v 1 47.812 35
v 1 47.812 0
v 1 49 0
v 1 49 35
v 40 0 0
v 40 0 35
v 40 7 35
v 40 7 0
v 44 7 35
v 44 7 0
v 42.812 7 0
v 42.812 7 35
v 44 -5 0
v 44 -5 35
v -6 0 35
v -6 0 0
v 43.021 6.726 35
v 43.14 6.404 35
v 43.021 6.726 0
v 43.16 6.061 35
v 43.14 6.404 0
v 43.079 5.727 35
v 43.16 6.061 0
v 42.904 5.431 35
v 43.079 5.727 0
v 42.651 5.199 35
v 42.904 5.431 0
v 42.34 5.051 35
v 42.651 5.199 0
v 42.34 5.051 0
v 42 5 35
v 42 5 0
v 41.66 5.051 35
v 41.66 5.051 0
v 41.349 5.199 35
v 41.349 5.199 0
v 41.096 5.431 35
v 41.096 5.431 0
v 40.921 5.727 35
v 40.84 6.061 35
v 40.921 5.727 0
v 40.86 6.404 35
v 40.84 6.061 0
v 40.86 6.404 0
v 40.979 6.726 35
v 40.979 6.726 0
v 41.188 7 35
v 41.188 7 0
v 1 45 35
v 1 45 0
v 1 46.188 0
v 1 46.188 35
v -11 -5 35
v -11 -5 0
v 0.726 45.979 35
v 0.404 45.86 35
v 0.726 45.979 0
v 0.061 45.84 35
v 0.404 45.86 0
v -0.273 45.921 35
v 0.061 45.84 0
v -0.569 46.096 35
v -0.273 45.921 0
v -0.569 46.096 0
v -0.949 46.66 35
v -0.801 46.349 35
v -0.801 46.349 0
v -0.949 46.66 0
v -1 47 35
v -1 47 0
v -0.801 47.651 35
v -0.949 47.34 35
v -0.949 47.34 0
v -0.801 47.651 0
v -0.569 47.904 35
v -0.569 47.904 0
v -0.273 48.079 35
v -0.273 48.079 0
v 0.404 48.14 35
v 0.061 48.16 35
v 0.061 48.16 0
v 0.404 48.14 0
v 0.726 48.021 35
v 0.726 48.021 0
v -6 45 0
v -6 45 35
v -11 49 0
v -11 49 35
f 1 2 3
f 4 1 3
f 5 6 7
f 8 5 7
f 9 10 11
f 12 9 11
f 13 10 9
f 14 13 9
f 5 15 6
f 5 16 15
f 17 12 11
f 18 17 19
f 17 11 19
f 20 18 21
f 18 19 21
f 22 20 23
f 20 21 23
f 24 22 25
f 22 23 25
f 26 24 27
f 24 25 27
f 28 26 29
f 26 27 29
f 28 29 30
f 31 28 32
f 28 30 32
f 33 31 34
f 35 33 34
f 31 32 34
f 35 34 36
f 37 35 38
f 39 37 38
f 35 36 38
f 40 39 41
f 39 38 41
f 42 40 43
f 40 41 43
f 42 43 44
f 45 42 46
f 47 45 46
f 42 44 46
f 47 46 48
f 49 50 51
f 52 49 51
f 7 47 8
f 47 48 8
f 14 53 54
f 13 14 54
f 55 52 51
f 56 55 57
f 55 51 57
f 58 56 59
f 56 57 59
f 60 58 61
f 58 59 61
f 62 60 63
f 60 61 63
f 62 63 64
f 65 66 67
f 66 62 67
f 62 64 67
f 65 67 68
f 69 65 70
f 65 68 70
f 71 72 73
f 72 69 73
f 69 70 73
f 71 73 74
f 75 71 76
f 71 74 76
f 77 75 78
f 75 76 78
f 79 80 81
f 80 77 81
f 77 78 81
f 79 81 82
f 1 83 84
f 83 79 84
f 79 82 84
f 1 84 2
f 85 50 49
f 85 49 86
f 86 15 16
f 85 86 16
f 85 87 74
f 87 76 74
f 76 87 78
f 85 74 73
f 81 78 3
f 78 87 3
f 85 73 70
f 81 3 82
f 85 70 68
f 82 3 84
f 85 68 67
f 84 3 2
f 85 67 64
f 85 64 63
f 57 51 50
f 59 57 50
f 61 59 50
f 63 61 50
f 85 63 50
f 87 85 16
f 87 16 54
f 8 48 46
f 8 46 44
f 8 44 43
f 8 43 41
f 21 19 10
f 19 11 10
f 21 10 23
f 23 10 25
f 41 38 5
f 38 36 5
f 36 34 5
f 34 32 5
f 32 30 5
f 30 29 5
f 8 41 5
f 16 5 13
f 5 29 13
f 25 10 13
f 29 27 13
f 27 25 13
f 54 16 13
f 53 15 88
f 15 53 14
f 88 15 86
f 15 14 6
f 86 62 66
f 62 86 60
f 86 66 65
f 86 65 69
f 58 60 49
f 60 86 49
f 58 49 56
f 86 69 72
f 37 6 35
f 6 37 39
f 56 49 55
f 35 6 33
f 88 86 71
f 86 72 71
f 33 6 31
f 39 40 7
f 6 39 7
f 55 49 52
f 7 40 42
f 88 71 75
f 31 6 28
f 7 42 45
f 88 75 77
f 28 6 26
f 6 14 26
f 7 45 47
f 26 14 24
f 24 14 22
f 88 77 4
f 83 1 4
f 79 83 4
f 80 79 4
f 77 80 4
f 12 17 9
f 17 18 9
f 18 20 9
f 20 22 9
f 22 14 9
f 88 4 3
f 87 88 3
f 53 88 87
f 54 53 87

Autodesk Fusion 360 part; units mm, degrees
sketch "Sketch1" plane through (0, 0, 0) normal (0, 1, 0) x (1, 0, 0)
  line L0 (0, 0) -> (44, 0)
  line L1 (44, 0) -> (44, -35)
  line L2 (44, -35) -> (0, -35)
  line L3 (0, -35) -> (0, 0)
  line L4 (0, 0) -> (-5, 0)
  line L5 (0, -35) -> (-5, -35)
  line L6 (-5, -35) -> (-5, 0)
  dimension "d1" = 44
  dimension "d2" = 35
  dimension "d3" = 5
  dimension "d4" = 5
extrude "Extrude1" add sketch "Sketch1" along normal blind 49 contours L3 L4 L5 L6 makes body 1
sketch "Sketch2" plane through (0, 0, 0) normal (0, 1, 0) x (1, 0, 0)
  line L0 (0, 0) -> (44, 0)
  line L1 (44, 0) -> (44, -35)
  line L2 (44, -35) -> (0, -35)
  line L3 (0, -35) -> (0, 0)
  dimension "d7" = 44
extrude "Extrude2" add sketch "Sketch2" against normal blind 2 separate body makes body 2
extrude "Extrude3" add 1 faces at (-3.3333, 0, 11.6667) along direction (0, -1, 0) blind 2 on bodies 1 bodies 1 2
extrude "Extrude4" cut 1 faces at (-5, 15, 23.3333) along direction (1, 0, 0) blind 3 on bodies 1 bodies 1
extrude "Extrude5" add 1 faces at (14, -2, 11.6667) along direction (0, -1, 0) blind 3 on bodies 1 bodies 1
extrude "Extrude6" add 1 faces at (-2, 13, 11.6667) along direction (-1, 0, 0) blind 3 on bodies 1 bodies 1
sketch "Sketch3" plane through (0, 0, 0) normal (0, 0, 1) x (1, 0, 0)
  line L0 (40, 0) -> (44, 0)
  line L1 (0, 49) -> (7, 49)
  curve L2
  curve L3
  curve L4
  curve L5
  curve L6
  curve L7
  curve L8
  curve L9
  curve L10
  curve A0
  curve A1
  curve L11
  curve L12
  curve L13
  curve L14
  curve L15
  curve L16
  curve L17
  curve L18
  curve L19
  curve L20
  curve L21
  curve L22
  curve A2
  curve L23
  line L24 (40, 0) -> (0, 0)
  line L25 (0, 0) -> (0, 45)
  line L26 (40, 0) -> (0, 0)
  line L27 (0, 0) -> (0, 45)
  line L28 (44, 0) -> (40, 0)
  line L29 (40, 0) -> (40, 5)
  line L30 (40, 5) -> (44, 5)
  line L31 (44, 5) -> (44, 0)
  line L32 (40, 5) -> (44, 5)
  line L33 (44, 5) -> (44, 7)
  line L34 (44, 7) -> (40, 7)
  line L35 (40, 7) -> (40, 5)
  circle A3 centre (42, 6.165) radius 1.165
  point P0 (44, 0)
  point P1 (44, 0)
  point P2 (0.0061, 44.9497)
  dimension "d77" = 5
  dimension "d78" = 4
  dimension "d79" = 2
  dimension "d80" = 2.33
extrude "Extrude9" add sketch "Sketch3" along normal blind 35 contours L0 L28 L29 L30 L31 L32 | L30 L32 L34 L35 A3 | L30 L32 L33 L34 A3 bodies 1
extrude "Extrude10" cut 1 faces at (0, 16.3333, 23.3333) along direction (-1, 0, 0) blind 1 on bodies 1 bodies 1
extrude "Extrude11" add 1 faces at (-5, 13, 11.6667) along direction (-1, 0, 0) blind 1 on bodies 1 bodies 1
extrude "Extrude13" add 1 faces at (-6, 13, 11.6667) along direction (-1, 0, 0) blind 5 on bodies 1 bodies 1
extrude "Extrude14" cut 1 faces at (-1, 16.3333, 23.3333) along direction (-1, 0, 0) blind 5 on bodies 1 bodies 1
sketch "Sketch5" plane through (0, 0, 0) normal (0, 0, 1) x (1, 0, 0)
  line L0 (1, 49) -> (-1, 49)
  line L1 (1, 45) -> (1, 49)
  line L2 (-1, 45) -> (1, 45)
  circle A0 centre (0.165, 47) radius 1.165
  line L3 (-1, 49) -> (-1, 45)
  line L4 (-6, 49) -> (-1, 49)
  line L5 (-6, 45) -> (-6, 49)
  line L6 (-6, 49) -> (-6, 45)
  line L7 (-1, 45) -> (-6, 45)
  line L8 (-1, 49) -> (-1, 45)
  point P0 (-6, 49)
  point P1 (-6, 45)
  point P2 (-6, 45)
  dimension "d87" = 5
  dimension "d88" = 4
  dimension "d89" = 2
  dimension "d90" = 2.33
extrude "Extrude15" add sketch "Sketch5" along normal blind 35 contours L0 L1 A0 L3 L8 | L3 L4 L5 L6 L7 L8 | L1 L2 A0 L3 L8 bodies 1
extrude "Extrude12" [suppressed]
extrude "Extrude7" [suppressed]
sketch "Sketch4" plane through (0, 0, 0) normal (0, 0, 1) x (1, 0, 0)
  line L0 (7.33, 45) -> (7.33, 49)
  line L1 (9.33, 49) -> (7.33, 49)
  line L2 (0, 49) -> (0, 45)
  line L3 (0, 45) -> (7.33, 45)
  line L4 (7.33, 45) -> (7.33, 49)
  line L5 (9.33, 45) -> (9.33, 49)
  line L6 (0, 45) -> (7.33, 45)
  line L7 (7.33, 49) -> (0, 49)
  line L8 (7.33, 49) -> (7.33, 45)
  circle A0 centre (8.495, 47) radius 1.165
  circle A1 centre (8.495, 47) radius 1.165
  line L9 (9.33, 45) -> (9.33, 49)
  line L10 (7.33, 49) -> (0, 49)
  line L11 (7.33, 49) -> (7.33, 45)
  line L12 (7.33, 45) -> (9.33, 45)
  line L13 (7.33, 45) -> (7.33, 49)
  line L14 (9.33, 49) -> (7.33, 49)
  line L15 (7.33, 45) -> (9.33, 45)
  line L16 (7.33, 45) -> (9.33, 45)
  line L17 (7.33, 49) -> (0, 49)
  line L18 (0, 45) -> (7.33, 45)
  line L19 (7.33, 49) -> (7.33, 45)
  line L20 (9.33, 45) -> (9.33, 49)
  circle A2 centre (8.495, 47) radius 1.165
  line L21 (9.33, 49) -> (7.33, 49)
  point P0 (0, 45)
  dimension "d66" = 7.33
  dimension "d67" = 4
  dimension "d68" = 2
  dimension "d69" = 7.33
  dimension "d70" = 4
  dimension "d71" = 2
  dimension "d72" = 7.33
  dimension "d73" = 4
  dimension "d74" = 2
extrude "Extrude8" [suppressed]
